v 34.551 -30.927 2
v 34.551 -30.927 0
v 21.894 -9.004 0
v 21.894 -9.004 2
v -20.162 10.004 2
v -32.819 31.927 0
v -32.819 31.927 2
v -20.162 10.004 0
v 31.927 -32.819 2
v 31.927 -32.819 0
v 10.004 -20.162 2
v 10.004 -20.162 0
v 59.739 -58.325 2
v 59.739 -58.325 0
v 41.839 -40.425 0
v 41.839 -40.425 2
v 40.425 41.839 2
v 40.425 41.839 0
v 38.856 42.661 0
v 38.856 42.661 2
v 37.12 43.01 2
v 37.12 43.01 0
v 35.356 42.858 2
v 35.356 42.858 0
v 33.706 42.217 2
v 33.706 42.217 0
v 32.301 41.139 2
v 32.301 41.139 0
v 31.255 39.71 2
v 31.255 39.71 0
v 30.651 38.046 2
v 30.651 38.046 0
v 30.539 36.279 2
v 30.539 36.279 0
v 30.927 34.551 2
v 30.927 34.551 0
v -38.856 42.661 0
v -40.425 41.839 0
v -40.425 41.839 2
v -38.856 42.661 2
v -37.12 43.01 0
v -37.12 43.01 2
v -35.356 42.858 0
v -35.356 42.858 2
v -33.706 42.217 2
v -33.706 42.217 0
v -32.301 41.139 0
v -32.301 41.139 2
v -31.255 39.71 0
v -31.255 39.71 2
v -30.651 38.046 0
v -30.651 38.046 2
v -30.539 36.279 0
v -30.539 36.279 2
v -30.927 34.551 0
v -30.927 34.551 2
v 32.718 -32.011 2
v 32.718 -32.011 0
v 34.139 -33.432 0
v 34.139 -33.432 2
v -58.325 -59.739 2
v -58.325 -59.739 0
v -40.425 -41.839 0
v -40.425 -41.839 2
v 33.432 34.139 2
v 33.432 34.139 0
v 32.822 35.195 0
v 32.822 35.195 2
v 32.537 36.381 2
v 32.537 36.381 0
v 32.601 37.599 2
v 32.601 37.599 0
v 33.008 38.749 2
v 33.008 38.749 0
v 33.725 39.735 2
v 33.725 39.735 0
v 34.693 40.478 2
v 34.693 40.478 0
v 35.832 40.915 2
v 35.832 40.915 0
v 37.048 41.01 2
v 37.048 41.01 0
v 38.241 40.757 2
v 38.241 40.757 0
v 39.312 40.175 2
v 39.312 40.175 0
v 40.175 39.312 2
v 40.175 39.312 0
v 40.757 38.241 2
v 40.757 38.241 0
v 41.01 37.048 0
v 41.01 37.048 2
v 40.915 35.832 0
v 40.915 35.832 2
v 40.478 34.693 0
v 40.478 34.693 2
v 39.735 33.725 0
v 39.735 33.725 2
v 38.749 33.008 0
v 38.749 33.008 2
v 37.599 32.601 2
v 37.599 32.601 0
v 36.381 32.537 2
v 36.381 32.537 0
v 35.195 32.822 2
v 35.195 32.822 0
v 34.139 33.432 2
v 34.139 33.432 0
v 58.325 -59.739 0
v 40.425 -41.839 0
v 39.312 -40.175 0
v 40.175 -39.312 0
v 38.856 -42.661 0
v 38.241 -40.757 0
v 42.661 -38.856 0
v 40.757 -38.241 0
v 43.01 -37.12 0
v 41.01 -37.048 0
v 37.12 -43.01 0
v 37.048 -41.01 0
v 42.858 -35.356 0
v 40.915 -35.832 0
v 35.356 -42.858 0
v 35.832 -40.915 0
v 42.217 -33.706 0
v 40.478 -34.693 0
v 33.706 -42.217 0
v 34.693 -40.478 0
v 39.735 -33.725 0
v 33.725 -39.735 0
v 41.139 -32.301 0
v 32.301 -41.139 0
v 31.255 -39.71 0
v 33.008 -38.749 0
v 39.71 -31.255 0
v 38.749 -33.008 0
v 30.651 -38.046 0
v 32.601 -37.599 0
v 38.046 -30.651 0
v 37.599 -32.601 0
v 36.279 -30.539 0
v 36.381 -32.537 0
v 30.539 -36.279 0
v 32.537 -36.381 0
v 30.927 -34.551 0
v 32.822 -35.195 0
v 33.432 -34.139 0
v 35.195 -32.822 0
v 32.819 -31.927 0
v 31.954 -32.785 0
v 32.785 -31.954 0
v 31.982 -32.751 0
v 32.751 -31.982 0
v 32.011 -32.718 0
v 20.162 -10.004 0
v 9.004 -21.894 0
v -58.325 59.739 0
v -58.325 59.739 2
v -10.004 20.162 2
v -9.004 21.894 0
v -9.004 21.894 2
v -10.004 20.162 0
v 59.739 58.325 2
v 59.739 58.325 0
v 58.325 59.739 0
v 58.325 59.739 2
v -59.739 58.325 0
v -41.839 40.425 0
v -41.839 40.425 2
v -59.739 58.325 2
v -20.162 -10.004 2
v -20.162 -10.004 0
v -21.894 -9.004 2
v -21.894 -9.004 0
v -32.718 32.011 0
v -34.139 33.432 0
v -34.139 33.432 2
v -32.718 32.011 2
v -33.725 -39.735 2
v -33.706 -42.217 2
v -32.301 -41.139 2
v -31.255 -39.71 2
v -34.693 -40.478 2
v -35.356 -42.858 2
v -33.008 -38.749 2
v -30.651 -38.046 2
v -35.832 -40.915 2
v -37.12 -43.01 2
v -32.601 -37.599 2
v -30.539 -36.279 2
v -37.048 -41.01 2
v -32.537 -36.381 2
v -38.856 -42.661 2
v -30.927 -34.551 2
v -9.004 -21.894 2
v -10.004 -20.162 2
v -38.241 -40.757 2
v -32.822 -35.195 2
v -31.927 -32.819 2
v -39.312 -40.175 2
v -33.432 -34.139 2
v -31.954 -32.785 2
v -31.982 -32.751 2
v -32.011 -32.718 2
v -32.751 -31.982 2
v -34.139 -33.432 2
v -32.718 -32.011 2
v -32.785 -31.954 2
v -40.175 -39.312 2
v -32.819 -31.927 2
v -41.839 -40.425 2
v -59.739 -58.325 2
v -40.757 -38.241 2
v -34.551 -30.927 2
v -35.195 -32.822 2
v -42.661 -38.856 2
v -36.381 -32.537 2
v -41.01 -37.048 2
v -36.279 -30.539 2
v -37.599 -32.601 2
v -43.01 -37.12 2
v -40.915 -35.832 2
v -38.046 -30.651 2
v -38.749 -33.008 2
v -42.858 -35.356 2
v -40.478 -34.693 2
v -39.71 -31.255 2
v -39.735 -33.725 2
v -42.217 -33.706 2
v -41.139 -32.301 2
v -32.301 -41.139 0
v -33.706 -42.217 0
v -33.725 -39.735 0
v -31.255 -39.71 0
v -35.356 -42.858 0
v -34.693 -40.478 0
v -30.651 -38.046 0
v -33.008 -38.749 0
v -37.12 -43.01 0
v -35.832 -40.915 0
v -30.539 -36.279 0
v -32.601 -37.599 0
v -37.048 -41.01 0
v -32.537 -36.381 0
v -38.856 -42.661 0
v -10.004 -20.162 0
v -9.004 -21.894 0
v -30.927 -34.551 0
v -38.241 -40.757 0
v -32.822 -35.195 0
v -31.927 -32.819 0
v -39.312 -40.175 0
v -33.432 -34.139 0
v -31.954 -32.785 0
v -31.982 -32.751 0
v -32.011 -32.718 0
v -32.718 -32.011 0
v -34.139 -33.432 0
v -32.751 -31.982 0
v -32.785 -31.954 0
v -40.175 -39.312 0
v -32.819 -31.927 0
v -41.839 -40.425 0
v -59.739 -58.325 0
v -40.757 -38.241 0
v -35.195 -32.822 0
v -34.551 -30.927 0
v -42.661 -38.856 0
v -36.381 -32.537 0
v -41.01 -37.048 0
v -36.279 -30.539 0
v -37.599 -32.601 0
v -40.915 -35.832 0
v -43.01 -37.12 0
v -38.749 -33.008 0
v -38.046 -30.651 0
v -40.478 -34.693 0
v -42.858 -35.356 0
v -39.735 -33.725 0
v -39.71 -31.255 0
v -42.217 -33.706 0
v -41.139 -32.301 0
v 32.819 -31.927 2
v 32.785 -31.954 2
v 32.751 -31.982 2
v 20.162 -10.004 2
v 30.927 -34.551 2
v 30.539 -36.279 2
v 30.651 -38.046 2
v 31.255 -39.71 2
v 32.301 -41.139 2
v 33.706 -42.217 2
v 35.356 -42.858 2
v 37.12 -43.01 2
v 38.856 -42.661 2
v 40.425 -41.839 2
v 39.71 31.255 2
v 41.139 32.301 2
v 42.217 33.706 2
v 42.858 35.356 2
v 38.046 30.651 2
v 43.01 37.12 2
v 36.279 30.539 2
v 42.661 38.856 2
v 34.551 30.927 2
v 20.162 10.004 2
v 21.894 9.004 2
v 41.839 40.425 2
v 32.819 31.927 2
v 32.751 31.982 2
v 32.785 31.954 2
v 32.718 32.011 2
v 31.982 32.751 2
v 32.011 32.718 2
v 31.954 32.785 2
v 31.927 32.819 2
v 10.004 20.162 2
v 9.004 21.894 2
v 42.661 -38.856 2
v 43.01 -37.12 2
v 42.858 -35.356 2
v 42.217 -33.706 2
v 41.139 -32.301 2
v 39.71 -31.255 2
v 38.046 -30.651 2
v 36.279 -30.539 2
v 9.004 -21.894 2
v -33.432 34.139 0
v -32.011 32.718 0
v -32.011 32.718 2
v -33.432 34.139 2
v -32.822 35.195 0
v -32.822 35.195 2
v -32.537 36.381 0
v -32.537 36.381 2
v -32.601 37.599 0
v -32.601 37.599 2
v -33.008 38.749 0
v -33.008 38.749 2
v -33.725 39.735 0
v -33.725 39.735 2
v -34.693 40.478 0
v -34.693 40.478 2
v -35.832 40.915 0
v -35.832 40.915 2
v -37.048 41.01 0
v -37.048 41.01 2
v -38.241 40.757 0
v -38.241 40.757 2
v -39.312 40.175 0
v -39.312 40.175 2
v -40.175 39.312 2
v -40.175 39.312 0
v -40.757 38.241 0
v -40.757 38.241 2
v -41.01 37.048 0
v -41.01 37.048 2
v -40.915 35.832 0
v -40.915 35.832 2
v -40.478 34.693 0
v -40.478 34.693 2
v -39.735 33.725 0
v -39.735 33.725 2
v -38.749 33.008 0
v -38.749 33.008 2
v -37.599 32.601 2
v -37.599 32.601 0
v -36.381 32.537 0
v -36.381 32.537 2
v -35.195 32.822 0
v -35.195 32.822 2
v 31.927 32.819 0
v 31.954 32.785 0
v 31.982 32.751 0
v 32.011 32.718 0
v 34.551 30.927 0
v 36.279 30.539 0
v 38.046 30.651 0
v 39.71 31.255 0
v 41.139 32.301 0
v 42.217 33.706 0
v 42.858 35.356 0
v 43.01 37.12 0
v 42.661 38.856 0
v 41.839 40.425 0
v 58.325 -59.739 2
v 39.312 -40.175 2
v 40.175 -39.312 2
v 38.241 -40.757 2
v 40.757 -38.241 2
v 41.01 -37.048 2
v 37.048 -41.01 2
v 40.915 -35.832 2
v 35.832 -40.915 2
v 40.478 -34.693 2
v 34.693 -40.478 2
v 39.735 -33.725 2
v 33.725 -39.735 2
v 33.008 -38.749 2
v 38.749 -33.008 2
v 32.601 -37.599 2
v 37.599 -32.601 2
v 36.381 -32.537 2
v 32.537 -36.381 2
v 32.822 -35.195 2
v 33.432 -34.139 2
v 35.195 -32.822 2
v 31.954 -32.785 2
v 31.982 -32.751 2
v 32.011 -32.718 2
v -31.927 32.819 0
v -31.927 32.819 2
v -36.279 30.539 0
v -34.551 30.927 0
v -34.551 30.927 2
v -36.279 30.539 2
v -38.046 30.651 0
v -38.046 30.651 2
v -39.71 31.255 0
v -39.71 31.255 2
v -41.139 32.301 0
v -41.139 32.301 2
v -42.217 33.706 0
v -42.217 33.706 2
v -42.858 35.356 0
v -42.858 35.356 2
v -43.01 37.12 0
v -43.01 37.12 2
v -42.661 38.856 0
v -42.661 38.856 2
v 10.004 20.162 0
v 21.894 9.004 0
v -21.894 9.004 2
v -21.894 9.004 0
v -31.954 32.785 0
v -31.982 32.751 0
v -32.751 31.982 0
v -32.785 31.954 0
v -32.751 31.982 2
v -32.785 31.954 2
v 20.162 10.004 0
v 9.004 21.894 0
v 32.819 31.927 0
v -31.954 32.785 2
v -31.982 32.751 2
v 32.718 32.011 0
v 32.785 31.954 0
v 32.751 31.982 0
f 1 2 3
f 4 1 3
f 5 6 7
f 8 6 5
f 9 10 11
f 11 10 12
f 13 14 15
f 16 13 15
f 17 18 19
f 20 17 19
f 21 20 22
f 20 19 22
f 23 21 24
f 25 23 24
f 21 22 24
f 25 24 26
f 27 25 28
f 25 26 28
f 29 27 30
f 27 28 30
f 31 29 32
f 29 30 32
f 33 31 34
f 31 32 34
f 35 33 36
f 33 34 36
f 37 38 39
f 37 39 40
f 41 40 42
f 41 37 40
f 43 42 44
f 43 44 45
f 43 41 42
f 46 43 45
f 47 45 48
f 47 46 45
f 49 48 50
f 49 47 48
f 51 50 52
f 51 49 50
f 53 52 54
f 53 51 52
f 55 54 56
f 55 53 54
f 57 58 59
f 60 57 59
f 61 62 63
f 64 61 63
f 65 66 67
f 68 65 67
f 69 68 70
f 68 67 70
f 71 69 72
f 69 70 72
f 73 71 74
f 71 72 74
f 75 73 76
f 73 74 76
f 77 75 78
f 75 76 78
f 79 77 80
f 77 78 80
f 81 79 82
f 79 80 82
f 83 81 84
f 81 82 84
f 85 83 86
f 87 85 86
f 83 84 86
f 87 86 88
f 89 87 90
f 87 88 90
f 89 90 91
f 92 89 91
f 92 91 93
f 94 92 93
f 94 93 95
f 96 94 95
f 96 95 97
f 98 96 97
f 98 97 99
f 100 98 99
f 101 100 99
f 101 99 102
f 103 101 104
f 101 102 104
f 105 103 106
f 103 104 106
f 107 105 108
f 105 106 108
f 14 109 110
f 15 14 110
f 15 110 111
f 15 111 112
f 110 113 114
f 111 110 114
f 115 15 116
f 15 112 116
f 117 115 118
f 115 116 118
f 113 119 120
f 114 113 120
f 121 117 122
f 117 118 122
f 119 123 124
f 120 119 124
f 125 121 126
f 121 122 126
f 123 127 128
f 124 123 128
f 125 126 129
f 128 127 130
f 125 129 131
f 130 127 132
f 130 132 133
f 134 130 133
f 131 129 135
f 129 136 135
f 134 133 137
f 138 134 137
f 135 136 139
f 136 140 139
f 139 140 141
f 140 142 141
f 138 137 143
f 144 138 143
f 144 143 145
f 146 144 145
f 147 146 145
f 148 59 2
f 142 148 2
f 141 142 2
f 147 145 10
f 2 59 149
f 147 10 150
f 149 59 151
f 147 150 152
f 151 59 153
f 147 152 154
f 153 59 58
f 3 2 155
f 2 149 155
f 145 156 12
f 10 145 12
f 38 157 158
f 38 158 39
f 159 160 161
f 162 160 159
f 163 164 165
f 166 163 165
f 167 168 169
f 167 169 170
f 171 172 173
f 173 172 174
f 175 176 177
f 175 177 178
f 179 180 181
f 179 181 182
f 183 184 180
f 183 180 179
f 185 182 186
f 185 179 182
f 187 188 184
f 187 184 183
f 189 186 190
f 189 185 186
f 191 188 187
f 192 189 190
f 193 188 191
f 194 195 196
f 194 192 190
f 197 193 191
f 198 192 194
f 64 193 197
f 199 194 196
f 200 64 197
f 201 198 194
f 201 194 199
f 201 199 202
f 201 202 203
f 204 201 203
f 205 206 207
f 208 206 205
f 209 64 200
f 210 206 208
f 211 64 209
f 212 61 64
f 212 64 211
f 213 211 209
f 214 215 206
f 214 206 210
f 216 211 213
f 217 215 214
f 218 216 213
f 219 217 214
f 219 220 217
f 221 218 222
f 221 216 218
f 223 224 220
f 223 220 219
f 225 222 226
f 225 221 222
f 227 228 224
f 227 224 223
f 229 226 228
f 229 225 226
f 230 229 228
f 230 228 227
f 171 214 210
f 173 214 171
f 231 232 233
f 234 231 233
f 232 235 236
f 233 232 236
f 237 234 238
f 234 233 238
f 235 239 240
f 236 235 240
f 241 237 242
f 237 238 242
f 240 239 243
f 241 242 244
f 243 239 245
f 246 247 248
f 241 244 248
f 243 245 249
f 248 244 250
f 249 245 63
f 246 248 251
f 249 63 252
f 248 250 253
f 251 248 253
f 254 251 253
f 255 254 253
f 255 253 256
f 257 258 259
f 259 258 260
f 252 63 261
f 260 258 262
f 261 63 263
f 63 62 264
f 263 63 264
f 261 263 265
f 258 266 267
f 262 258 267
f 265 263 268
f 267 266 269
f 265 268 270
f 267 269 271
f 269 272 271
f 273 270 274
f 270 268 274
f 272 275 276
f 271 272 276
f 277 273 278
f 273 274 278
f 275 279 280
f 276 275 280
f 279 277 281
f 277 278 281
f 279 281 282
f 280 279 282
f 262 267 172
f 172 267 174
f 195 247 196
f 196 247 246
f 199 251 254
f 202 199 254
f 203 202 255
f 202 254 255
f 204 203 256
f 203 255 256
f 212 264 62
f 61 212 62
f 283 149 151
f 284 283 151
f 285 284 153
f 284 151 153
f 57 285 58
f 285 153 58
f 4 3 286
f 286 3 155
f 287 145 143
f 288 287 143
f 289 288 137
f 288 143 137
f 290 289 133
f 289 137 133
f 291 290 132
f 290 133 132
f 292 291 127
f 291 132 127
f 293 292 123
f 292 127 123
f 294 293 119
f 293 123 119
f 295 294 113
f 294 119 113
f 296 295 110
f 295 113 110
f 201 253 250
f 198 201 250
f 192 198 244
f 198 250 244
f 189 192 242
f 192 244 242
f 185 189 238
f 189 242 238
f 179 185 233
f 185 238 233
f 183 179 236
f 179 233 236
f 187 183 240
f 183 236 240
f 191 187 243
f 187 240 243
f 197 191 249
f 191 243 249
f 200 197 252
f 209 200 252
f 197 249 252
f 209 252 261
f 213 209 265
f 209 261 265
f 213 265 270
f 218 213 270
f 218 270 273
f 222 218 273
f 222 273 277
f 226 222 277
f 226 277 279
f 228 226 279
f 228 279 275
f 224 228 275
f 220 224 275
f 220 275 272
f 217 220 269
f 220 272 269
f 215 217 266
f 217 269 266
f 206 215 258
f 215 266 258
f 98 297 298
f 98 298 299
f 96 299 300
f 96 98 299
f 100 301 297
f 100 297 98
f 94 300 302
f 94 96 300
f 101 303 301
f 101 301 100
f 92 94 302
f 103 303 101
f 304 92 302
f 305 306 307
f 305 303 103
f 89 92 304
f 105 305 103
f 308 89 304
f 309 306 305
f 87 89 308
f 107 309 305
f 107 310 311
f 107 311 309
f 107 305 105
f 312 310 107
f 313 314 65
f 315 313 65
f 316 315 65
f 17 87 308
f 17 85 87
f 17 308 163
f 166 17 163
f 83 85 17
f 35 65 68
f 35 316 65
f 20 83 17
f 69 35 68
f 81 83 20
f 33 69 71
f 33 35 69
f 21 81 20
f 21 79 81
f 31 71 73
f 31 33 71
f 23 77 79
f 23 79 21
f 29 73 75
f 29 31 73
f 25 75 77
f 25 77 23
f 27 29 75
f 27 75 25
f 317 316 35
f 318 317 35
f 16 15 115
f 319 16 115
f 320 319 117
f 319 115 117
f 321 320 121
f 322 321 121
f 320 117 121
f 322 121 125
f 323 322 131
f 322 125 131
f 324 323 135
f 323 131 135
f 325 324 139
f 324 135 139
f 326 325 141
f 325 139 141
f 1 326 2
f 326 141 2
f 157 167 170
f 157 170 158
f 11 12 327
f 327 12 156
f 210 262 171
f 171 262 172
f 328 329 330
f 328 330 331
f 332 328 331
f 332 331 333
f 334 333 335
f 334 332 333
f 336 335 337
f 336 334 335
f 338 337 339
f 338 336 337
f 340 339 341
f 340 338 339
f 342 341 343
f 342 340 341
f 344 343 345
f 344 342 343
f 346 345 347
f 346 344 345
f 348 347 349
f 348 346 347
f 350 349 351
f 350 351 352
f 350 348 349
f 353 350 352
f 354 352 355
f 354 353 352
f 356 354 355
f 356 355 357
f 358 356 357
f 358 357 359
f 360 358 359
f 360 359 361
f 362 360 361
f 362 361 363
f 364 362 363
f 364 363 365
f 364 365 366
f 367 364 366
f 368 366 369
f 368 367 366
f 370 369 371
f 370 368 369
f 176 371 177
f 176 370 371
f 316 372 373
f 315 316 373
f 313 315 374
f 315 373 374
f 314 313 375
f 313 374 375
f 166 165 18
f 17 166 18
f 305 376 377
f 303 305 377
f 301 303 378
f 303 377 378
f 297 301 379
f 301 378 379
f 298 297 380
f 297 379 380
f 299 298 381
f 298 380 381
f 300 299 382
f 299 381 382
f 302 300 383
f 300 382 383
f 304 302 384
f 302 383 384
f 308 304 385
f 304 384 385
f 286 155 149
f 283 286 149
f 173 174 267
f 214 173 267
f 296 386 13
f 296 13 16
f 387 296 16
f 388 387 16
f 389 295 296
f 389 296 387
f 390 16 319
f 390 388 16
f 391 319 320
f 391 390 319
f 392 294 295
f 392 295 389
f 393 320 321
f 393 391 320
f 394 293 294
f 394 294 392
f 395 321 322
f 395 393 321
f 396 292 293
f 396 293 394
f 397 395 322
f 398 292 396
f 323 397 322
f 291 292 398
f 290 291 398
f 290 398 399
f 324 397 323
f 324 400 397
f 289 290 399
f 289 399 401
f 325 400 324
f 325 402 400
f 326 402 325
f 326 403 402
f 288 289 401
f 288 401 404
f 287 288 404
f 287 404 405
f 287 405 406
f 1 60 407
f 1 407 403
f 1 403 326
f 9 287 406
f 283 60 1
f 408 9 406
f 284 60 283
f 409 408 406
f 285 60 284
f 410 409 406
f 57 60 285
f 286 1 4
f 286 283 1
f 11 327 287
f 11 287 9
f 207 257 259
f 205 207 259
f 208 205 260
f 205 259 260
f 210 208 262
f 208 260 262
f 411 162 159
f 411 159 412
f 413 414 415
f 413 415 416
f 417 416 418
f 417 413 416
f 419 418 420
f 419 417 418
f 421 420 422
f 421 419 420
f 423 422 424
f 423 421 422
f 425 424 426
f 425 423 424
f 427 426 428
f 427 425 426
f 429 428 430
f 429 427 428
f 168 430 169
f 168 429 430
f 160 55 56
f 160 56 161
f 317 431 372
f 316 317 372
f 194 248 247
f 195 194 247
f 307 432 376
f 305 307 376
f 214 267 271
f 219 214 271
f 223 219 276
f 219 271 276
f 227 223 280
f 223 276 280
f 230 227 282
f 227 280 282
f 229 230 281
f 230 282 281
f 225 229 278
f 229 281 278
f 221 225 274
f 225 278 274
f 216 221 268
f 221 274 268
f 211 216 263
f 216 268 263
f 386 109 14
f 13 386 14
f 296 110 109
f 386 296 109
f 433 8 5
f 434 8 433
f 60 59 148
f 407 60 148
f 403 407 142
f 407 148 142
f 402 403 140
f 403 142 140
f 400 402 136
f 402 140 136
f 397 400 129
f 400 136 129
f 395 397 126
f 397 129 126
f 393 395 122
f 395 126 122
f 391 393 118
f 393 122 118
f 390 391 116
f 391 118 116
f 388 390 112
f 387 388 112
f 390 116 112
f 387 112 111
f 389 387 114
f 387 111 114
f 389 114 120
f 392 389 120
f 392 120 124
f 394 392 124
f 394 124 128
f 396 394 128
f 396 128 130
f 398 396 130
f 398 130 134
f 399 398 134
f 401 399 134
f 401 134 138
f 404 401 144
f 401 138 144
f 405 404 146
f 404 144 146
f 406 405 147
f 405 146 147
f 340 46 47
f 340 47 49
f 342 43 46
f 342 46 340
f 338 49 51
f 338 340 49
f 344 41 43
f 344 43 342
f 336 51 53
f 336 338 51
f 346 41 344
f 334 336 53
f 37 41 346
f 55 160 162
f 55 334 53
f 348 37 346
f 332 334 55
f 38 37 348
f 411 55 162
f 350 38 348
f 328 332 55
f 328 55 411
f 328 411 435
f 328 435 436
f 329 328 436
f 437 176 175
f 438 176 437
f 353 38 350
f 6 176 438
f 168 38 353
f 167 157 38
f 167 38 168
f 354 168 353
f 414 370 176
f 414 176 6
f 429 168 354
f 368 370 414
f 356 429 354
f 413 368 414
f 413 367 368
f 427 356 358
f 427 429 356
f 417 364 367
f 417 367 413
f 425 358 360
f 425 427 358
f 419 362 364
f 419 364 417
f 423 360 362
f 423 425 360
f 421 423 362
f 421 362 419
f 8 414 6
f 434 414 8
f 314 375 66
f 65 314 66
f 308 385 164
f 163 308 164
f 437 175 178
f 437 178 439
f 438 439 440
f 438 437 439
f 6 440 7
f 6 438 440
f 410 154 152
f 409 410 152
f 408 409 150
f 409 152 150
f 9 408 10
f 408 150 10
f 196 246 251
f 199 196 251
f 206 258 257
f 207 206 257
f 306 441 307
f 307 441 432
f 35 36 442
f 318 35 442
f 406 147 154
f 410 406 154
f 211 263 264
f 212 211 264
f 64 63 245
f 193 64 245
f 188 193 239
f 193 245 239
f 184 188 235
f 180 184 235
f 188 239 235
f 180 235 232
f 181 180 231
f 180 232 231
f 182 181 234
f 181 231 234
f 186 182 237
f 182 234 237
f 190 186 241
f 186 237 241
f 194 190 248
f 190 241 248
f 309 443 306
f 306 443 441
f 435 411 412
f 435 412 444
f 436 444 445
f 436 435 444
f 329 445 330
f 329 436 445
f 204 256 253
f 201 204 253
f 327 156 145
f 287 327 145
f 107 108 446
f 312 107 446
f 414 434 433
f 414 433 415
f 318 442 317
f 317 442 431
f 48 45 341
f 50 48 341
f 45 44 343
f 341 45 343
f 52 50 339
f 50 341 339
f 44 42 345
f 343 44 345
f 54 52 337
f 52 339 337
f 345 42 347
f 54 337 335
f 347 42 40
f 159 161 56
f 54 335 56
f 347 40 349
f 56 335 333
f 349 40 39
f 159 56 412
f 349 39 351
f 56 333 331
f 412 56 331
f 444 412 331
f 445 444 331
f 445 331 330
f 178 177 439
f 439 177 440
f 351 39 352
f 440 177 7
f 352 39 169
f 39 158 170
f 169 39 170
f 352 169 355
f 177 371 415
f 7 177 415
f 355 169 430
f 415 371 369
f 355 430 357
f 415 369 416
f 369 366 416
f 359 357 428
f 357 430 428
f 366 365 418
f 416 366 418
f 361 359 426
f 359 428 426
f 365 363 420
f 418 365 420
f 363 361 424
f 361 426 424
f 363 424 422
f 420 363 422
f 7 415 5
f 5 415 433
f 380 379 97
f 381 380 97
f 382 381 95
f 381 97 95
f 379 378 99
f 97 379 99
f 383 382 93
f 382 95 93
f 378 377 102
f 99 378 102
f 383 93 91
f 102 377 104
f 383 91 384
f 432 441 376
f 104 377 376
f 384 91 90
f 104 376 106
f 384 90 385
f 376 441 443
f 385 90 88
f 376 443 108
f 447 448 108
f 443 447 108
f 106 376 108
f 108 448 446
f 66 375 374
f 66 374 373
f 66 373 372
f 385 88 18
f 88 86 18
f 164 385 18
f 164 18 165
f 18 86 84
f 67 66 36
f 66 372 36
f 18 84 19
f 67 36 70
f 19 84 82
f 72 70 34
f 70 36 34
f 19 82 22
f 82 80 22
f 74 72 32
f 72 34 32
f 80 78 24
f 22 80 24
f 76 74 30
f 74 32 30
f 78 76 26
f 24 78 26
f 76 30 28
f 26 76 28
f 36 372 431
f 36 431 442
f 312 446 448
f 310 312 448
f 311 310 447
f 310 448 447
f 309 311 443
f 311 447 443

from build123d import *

# Parameters (mm, degrees)
EXTRUDE_DEPTH    = 2
EXTRUDE001_DEPTH = 2
EXTRUDE002_DEPTH = 2
EXTRUDE003_DEPTH = 2


with BuildPart() as extrude_body:
    # Face → Extrude (new body)
    with BuildSketch(Plane(origin=(-33.892057, 33.892057, 0), x_dir=(0, -1, 0), z_dir=(0, 0, -1))):
        with BuildLine():
            Line((24.888333, -11.998412), (2.965432, 0.65878))
            ThreePointArc((2.965432, 0.65878), (0.927263, 7.835954), (-6.532871, 7.947084))
            Line((-6.532871, 7.947084), (-24.432844, 25.847058))
            Line((-24.432844, 25.847058), (-25.847058, 24.432844))
            Line((-25.847058, 24.432844), (-7.947084, 6.532871))
            ThreePointArc((-7.947084, 6.532871), (-7.835954, -0.927263), (-0.65878, -2.965432))
            Line((-0.65878, -2.965432), (11.998412, -24.888333))
            Line((11.998412, -24.888333), (13.730463, -23.888333))
            Line((13.730463, -23.888333), (1.07327, -1.965432))
            ThreePointArc((1.07327, -1.965432), (1.123958, -1.923636), (1.174204, -1.88131))
            Line((1.174204, -1.88131), (-0.246715, -0.460392))
            ThreePointArc((-0.246715, -0.460392), (-5.882699, 5.882699), (0.460392, 0.246715))
            Line((0.460392, 0.246715), (1.88131, -1.174204))
            ThreePointArc((1.88131, -1.174204), (1.923636, -1.123958), (1.965432, -1.07327))
            Line((1.965432, -1.07327), (23.888333, -13.730463))
            Line((23.888333, -13.730463), (24.888333, -11.998412))
        make_face()
    extrude(amount=-EXTRUDE_DEPTH)


with BuildPart() as extrude001:
    # Face001 → Extrude001 (new body)
    with BuildSketch(Plane(origin=(33.892057, 33.892057, 0), x_dir=(0, 1, 0), z_dir=(0, 0, 1))):
        with BuildLine():
            Line((25.847058, -24.432844), (7.947084, -6.532871))
            ThreePointArc((7.947084, -6.532871), (7.835954, 0.927263), (0.65878, 2.965432))
            Line((0.65878, 2.965432), (-11.998412, 24.888333))
            Line((-11.998412, 24.888333), (-13.730463, 23.888333))
            Line((-13.730463, 23.888333), (-1.07327, 1.965432))
            ThreePointArc((-1.07327, 1.965432), (-1.123958, 1.923636), (-1.174204, 1.88131))
            Line((-1.174204, 1.88131), (0.246715, 0.460392))
            ThreePointArc((0.246715, 0.460392), (5.882699, -5.882699), (-0.460392, -0.246715))
            Line((-0.460392, -0.246715), (-1.88131, 1.174204))
            ThreePointArc((-1.88131, 1.174204), (-1.923636, 1.123958), (-1.965432, 1.07327))
            Line((-1.965432, 1.07327), (-23.888333, 13.730463))
            Line((-23.888333, 13.730463), (-24.888333, 11.998412))
            Line((-24.888333, 11.998412), (-2.965432, -0.65878))
            ThreePointArc((-2.965432, -0.65878), (-0.927263, -7.835954), (6.532871, -7.947084))
            Line((6.532871, -7.947084), (24.432844, -25.847058))
            Line((24.432844, -25.847058), (25.847058, -24.432844))
        make_face()
    extrude(amount=EXTRUDE001_DEPTH)


with BuildPart() as extrude002:
    # Face002 → Extrude002 (new body)
    with BuildSketch(Plane(origin=(33.892057, -33.892057, 0), x_dir=(0, 1, 0), z_dir=(0, 0, 1))):
        with BuildLine():
            Line((11.998412, 24.888333), (-0.65878, 2.965432))
            ThreePointArc((-0.65878, 2.965432), (-7.835954, 0.927263), (-7.947084, -6.532871))
            Line((-7.947084, -6.532871), (-25.847058, -24.432844))
            Line((-25.847058, -24.432844), (-24.432844, -25.847058))
            Line((-24.432844, -25.847058), (-6.532871, -7.947084))
            ThreePointArc((-6.532871, -7.947084), (0.927263, -7.835954), (2.965432, -0.65878))
            Line((2.965432, -0.65878), (24.888333, 11.998412))
            Line((24.888333, 11.998412), (23.888333, 13.730463))
            Line((23.888333, 13.730463), (1.965432, 1.07327))
            ThreePointArc((1.965432, 1.07327), (1.923636, 1.123958), (1.88131, 1.174204))
            Line((1.88131, 1.174204), (0.460392, -0.246715))
            ThreePointArc((0.460392, -0.246715), (-5.882699, -5.882699), (-0.246715, 0.460392))
            Line((-0.246715, 0.460392), (1.174204, 1.88131))
            ThreePointArc((1.174204, 1.88131), (1.123958, 1.923636), (1.07327, 1.965432))
            Line((1.07327, 1.965432), (13.730463, 23.888333))
            Line((13.730463, 23.888333), (11.998412, 24.888333))
        make_face()
    extrude(amount=EXTRUDE002_DEPTH)


with BuildPart() as extrude003:
    # Face003 → Extrude003 (new body)
    with BuildSketch(Plane(origin=(-33.892057, -33.892057, 0), x_dir=(0, 1, 0), z_dir=(0, 0, 1))):
        with BuildLine():
            Line((24.888333, -11.998412), (2.965432, 0.65878))
            ThreePointArc((2.965432, 0.65878), (0.927263, 7.835954), (-6.532871, 7.947084))
            Line((-6.532871, 7.947084), (-24.432844, 25.847058))
            Line((-24.432844, 25.847058), (-25.847058, 24.432844))
            Line((-25.847058, 24.432844), (-7.947084, 6.532871))
            ThreePointArc((-7.947084, 6.532871), (-7.835954, -0.927263), (-0.65878, -2.965432))
            Line((-0.65878, -2.965432), (11.998412, -24.888333))
            Line((11.998412, -24.888333), (13.730463, -23.888333))
            Line((13.730463, -23.888333), (1.07327, -1.965432))
            ThreePointArc((1.07327, -1.965432), (1.123958, -1.923636), (1.174204, -1.88131))
            Line((1.174204, -1.88131), (-0.246715, -0.460392))
            ThreePointArc((-0.246715, -0.460392), (-5.882699, 5.882699), (0.460392, 0.246715))
            Line((0.460392, 0.246715), (1.88131, -1.174204))
            ThreePointArc((1.88131, -1.174204), (1.923636, -1.123958), (1.965432, -1.07327))
            Line((1.965432, -1.07327), (23.888333, -13.730463))
            Line((23.888333, -13.730463), (24.888333, -11.998412))
        make_face()
    extrude(amount=EXTRUDE003_DEPTH)


solid = Compound([extrude_body.part, extrude001.part, extrude002.part, extrude003.part])
